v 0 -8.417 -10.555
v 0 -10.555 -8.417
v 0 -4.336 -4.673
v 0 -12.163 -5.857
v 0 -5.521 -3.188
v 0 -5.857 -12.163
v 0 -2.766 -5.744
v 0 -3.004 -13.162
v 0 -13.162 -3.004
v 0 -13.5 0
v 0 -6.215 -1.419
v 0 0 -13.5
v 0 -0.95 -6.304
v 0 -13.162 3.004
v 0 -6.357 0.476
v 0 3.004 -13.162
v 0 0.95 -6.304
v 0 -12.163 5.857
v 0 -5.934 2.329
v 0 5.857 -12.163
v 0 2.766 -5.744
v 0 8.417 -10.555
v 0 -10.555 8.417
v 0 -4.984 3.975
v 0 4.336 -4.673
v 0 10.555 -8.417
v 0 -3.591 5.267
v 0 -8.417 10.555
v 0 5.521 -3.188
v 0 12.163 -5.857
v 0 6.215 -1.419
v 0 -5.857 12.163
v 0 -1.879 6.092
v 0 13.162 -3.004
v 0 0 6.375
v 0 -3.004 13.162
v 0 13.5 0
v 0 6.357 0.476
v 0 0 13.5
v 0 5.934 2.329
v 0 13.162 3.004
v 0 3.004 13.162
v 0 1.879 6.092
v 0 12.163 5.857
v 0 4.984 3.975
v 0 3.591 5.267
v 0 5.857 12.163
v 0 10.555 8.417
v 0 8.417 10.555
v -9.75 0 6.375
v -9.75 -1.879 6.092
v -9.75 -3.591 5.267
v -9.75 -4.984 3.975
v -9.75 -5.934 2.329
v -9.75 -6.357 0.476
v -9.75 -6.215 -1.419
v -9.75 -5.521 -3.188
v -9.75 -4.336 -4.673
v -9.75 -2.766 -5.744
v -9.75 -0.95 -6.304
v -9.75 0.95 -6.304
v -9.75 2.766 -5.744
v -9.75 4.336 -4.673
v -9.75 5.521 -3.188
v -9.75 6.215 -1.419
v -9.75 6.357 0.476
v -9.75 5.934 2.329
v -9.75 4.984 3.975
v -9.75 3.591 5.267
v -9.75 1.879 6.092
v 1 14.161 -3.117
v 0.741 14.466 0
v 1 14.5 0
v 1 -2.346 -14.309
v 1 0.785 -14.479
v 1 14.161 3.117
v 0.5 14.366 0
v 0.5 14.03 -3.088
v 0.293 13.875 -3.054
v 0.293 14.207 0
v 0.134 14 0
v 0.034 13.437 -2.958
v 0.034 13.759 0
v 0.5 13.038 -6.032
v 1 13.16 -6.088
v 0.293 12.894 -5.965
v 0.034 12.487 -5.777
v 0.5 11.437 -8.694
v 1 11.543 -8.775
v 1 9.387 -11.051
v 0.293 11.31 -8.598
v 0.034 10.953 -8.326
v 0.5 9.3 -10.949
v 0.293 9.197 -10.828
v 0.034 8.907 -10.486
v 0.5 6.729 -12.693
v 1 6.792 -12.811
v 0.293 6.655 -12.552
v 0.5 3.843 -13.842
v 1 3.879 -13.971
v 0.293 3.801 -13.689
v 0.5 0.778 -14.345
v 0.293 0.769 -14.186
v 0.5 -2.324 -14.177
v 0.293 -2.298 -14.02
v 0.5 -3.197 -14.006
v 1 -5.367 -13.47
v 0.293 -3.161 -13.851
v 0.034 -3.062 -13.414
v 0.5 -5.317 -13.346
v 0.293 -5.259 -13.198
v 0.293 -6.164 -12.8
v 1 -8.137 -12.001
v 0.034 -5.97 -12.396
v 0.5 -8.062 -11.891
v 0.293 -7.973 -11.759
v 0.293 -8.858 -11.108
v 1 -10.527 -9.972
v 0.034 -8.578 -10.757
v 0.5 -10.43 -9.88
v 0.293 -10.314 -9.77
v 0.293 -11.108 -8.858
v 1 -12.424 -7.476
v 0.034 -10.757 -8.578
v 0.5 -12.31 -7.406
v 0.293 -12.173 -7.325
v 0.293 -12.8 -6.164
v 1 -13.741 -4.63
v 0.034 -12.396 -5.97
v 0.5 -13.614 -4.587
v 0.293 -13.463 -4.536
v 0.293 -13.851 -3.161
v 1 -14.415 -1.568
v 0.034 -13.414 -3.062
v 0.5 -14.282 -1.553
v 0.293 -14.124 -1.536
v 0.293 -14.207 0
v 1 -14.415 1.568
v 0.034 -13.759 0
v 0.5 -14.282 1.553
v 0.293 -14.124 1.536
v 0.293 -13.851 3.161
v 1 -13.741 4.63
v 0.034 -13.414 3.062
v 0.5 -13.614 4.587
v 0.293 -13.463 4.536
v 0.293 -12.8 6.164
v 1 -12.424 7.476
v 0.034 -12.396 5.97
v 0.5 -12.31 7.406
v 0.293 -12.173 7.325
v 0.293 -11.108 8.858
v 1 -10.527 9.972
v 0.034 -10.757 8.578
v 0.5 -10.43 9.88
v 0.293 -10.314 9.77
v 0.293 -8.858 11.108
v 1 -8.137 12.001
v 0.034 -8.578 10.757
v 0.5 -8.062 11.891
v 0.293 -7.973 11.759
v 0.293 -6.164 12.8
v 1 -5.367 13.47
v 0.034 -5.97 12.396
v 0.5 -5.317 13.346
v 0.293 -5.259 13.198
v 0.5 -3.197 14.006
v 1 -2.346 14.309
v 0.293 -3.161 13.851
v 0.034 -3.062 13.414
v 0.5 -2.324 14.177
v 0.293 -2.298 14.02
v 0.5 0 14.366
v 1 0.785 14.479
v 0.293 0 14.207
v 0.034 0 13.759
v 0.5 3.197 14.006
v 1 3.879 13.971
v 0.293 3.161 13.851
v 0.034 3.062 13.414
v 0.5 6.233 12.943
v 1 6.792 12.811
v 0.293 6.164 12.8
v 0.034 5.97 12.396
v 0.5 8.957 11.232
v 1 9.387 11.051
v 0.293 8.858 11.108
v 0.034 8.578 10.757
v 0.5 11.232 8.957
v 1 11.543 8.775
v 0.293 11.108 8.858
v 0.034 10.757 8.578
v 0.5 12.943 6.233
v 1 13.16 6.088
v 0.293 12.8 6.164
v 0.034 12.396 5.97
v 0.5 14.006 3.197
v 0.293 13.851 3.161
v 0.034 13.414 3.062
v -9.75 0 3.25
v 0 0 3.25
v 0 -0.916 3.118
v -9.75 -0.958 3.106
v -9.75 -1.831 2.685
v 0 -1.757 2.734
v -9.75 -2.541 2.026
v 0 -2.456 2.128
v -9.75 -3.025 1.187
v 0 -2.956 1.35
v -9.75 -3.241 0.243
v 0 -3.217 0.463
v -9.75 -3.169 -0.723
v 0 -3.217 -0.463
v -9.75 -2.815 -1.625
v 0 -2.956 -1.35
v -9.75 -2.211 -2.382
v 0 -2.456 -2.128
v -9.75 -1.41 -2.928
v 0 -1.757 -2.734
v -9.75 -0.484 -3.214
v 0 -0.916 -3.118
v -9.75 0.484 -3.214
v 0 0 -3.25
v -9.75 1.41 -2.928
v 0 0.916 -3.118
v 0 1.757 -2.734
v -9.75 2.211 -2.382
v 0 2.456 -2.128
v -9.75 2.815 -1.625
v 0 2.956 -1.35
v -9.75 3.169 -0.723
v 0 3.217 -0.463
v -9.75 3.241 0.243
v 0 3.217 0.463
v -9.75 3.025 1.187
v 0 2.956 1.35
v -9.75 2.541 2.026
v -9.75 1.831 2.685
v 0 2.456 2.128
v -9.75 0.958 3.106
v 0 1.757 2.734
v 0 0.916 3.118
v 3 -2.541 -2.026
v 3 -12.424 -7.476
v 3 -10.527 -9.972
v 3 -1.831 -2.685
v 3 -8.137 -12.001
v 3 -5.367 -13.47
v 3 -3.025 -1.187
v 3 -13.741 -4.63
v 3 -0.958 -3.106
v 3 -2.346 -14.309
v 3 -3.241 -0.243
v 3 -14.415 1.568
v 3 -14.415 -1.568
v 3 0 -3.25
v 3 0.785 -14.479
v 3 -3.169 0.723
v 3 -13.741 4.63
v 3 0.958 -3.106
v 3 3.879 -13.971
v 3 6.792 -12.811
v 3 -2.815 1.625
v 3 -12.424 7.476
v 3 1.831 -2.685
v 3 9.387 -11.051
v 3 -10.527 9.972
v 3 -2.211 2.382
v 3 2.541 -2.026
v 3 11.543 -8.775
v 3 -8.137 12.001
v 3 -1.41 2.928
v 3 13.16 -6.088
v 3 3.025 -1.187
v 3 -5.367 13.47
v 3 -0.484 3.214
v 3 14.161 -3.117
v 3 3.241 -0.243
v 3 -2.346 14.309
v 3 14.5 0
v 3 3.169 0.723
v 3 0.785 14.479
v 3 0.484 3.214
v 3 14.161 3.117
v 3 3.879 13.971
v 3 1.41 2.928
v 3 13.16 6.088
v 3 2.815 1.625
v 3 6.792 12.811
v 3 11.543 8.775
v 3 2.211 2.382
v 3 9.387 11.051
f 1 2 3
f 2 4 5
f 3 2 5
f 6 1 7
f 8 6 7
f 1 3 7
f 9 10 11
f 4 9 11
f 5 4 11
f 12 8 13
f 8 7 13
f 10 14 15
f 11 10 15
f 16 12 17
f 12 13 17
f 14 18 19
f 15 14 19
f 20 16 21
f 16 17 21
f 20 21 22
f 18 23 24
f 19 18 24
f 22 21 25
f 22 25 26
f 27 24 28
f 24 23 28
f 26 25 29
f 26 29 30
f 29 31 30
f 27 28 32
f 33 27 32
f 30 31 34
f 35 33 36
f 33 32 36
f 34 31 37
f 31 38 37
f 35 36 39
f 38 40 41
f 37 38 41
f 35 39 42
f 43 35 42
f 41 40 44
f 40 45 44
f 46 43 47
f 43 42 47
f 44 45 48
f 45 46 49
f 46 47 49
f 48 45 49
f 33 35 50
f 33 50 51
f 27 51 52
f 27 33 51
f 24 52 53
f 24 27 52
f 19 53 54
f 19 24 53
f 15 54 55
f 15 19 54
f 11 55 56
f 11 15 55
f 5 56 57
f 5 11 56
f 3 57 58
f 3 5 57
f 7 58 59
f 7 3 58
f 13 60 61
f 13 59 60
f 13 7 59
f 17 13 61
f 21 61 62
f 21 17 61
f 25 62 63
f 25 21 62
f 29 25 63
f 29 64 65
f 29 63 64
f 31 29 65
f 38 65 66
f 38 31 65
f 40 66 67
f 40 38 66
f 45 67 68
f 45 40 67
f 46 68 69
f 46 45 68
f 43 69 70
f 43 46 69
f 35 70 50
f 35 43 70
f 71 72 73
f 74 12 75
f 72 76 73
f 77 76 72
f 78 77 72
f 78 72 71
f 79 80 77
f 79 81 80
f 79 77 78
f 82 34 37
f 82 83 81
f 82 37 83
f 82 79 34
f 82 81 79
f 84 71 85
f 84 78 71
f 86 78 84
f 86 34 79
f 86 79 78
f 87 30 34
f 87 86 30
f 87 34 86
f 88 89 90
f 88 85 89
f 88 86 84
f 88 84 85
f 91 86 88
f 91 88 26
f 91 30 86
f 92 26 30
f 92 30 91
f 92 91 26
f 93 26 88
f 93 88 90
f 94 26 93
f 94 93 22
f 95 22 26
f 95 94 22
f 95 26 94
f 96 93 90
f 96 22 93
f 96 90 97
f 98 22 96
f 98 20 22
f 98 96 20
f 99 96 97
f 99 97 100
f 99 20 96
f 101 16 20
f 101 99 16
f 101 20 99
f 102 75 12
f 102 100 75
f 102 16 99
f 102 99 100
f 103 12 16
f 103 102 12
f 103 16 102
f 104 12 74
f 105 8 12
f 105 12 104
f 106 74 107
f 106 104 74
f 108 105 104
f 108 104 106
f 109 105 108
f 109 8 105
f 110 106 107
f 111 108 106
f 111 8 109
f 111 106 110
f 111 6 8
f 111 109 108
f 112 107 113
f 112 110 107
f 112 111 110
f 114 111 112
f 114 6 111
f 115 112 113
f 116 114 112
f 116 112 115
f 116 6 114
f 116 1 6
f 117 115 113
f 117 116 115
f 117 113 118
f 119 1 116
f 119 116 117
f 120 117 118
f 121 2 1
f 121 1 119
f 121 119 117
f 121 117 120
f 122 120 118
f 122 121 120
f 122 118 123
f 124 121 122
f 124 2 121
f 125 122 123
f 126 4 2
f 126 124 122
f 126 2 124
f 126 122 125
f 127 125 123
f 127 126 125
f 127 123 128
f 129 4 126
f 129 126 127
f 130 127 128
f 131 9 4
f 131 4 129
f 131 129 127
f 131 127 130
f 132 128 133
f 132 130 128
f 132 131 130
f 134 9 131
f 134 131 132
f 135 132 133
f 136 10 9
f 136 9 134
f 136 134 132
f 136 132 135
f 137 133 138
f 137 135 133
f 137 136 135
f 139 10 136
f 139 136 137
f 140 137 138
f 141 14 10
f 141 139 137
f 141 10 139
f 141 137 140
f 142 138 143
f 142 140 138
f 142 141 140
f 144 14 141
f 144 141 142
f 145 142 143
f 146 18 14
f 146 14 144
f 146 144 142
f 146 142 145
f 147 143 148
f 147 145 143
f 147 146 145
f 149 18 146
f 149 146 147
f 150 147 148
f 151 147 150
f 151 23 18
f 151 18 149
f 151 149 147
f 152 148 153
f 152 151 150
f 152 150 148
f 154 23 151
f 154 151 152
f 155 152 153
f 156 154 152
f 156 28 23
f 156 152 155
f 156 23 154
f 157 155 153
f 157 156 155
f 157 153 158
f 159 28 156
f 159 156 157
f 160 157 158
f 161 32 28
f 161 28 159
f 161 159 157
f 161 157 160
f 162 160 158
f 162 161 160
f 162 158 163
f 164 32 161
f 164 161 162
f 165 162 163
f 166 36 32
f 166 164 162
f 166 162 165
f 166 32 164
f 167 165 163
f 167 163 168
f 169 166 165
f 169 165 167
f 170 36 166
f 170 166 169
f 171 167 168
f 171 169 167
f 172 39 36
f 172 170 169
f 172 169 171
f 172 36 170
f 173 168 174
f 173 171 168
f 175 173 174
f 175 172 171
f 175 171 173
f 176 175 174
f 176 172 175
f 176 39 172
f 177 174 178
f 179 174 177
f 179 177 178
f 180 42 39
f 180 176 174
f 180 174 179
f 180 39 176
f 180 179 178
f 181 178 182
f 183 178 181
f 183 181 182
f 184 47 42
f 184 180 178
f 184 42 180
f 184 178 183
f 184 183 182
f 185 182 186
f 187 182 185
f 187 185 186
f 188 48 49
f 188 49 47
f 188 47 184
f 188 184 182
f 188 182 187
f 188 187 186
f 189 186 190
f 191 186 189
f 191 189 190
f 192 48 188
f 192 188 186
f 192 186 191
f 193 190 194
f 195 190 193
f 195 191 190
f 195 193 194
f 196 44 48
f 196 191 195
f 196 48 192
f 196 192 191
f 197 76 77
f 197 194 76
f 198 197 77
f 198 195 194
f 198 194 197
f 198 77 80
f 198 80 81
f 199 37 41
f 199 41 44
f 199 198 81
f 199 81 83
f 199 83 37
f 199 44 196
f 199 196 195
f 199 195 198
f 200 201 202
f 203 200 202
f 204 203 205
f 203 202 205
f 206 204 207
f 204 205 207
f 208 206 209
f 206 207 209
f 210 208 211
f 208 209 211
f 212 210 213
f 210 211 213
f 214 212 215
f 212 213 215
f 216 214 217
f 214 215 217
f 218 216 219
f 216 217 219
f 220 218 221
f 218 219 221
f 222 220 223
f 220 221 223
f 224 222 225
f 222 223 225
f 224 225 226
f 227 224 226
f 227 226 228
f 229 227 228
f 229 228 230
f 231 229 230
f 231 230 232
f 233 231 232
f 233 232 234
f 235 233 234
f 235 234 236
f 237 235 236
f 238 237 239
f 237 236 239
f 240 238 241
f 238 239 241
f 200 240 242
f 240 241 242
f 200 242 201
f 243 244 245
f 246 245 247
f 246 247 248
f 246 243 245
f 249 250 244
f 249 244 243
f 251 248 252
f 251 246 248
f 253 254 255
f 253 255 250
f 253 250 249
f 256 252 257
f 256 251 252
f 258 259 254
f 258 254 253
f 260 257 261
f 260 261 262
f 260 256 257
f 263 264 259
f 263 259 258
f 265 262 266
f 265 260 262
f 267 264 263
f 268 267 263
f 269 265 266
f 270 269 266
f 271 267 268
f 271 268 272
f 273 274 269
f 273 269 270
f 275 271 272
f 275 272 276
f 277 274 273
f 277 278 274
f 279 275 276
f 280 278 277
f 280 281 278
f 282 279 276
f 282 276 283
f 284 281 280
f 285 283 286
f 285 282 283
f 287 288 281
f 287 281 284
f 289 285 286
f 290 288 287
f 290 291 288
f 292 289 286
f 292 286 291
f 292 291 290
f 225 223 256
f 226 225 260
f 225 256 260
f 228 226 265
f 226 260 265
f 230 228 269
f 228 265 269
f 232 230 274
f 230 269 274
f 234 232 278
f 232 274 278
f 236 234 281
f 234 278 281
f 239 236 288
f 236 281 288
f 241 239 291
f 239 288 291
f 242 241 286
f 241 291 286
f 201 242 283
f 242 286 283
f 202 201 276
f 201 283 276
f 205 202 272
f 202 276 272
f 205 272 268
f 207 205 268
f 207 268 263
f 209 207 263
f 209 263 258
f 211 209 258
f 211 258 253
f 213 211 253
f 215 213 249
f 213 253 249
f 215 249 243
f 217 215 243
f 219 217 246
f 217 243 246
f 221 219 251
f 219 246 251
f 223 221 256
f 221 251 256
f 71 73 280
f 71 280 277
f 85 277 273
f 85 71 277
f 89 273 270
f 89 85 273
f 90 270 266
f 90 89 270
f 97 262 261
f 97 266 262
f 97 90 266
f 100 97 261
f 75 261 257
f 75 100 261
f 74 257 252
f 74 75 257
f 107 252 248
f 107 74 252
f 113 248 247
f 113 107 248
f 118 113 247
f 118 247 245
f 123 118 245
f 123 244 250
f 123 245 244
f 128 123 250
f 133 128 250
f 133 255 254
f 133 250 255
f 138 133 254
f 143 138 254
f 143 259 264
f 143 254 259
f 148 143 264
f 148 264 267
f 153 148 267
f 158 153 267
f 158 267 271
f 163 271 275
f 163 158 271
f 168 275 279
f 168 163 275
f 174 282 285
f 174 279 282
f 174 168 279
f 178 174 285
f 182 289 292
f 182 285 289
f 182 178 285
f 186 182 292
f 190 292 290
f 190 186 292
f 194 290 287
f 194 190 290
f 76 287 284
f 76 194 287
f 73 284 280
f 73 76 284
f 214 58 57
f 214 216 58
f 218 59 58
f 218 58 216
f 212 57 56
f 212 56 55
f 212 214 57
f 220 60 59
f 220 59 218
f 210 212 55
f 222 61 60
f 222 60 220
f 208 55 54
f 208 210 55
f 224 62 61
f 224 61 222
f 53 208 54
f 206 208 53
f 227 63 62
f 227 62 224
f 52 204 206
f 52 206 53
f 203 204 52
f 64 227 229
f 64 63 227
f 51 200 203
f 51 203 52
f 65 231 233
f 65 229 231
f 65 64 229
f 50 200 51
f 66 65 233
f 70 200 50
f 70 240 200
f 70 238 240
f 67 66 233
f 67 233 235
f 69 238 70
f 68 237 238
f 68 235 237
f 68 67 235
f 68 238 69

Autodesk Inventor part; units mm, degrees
ref_plane "YZ Plane" through (0, 0, 0) normal (1, 0, 0) x (0, 1, 0)
ref_plane "XZ Plane" through (0, 0, 0) normal (0, 1, 0) x (-1, 0, 0)
ref_plane "XY Plane" through (0, 0, 0) normal (0, 0, 1) x (1, 0, 0)
sketch "Sketch1" plane through (0, 0, 0) normal (1, 0, 0) x (0, 1, 0)
  circle A0 centre (0, 0) radius 14.5
  dimension "d0" = 29
extrude "Extrusion1" add sketch "Sketch1" along normal blind 3
fillet "Fillet1" radius 1 1 edges at (0, -14.5, 0)
sketch "Sketch2" plane through (0, 0, 0) normal (-1, 0, 0) x (0, 0, 1)
  point P0 (0, 0)
sketch "Sketch3" plane through (3, 0, 0) normal (1, 0, 0) x (0, 0, -1)
  circle A0 centre (0, 0) radius 3.25
  dimension "d4" = 6.5
extrude "Extrusion2" cut sketch "Sketch3" against normal blind 3
sketch "Sketch4" plane through (0, 0, 0) normal (-1, 0, 0) x (0, 0, 1)
  circle A0 centre (0, 0) radius 3.25
  circle A1 centre (0, 0) radius 6.375
  dimension "d7" = 12.75
sketch "Sketch5" plane through (0, 0, 0) normal (-1, 0, 0) x (0, 0, 1)
  point P0 (0, 0)
extrude "Extrusion3" add sketch "Sketch4" along normal blind 9.75
properties part number "thiccBB_hubsSlideIn"
